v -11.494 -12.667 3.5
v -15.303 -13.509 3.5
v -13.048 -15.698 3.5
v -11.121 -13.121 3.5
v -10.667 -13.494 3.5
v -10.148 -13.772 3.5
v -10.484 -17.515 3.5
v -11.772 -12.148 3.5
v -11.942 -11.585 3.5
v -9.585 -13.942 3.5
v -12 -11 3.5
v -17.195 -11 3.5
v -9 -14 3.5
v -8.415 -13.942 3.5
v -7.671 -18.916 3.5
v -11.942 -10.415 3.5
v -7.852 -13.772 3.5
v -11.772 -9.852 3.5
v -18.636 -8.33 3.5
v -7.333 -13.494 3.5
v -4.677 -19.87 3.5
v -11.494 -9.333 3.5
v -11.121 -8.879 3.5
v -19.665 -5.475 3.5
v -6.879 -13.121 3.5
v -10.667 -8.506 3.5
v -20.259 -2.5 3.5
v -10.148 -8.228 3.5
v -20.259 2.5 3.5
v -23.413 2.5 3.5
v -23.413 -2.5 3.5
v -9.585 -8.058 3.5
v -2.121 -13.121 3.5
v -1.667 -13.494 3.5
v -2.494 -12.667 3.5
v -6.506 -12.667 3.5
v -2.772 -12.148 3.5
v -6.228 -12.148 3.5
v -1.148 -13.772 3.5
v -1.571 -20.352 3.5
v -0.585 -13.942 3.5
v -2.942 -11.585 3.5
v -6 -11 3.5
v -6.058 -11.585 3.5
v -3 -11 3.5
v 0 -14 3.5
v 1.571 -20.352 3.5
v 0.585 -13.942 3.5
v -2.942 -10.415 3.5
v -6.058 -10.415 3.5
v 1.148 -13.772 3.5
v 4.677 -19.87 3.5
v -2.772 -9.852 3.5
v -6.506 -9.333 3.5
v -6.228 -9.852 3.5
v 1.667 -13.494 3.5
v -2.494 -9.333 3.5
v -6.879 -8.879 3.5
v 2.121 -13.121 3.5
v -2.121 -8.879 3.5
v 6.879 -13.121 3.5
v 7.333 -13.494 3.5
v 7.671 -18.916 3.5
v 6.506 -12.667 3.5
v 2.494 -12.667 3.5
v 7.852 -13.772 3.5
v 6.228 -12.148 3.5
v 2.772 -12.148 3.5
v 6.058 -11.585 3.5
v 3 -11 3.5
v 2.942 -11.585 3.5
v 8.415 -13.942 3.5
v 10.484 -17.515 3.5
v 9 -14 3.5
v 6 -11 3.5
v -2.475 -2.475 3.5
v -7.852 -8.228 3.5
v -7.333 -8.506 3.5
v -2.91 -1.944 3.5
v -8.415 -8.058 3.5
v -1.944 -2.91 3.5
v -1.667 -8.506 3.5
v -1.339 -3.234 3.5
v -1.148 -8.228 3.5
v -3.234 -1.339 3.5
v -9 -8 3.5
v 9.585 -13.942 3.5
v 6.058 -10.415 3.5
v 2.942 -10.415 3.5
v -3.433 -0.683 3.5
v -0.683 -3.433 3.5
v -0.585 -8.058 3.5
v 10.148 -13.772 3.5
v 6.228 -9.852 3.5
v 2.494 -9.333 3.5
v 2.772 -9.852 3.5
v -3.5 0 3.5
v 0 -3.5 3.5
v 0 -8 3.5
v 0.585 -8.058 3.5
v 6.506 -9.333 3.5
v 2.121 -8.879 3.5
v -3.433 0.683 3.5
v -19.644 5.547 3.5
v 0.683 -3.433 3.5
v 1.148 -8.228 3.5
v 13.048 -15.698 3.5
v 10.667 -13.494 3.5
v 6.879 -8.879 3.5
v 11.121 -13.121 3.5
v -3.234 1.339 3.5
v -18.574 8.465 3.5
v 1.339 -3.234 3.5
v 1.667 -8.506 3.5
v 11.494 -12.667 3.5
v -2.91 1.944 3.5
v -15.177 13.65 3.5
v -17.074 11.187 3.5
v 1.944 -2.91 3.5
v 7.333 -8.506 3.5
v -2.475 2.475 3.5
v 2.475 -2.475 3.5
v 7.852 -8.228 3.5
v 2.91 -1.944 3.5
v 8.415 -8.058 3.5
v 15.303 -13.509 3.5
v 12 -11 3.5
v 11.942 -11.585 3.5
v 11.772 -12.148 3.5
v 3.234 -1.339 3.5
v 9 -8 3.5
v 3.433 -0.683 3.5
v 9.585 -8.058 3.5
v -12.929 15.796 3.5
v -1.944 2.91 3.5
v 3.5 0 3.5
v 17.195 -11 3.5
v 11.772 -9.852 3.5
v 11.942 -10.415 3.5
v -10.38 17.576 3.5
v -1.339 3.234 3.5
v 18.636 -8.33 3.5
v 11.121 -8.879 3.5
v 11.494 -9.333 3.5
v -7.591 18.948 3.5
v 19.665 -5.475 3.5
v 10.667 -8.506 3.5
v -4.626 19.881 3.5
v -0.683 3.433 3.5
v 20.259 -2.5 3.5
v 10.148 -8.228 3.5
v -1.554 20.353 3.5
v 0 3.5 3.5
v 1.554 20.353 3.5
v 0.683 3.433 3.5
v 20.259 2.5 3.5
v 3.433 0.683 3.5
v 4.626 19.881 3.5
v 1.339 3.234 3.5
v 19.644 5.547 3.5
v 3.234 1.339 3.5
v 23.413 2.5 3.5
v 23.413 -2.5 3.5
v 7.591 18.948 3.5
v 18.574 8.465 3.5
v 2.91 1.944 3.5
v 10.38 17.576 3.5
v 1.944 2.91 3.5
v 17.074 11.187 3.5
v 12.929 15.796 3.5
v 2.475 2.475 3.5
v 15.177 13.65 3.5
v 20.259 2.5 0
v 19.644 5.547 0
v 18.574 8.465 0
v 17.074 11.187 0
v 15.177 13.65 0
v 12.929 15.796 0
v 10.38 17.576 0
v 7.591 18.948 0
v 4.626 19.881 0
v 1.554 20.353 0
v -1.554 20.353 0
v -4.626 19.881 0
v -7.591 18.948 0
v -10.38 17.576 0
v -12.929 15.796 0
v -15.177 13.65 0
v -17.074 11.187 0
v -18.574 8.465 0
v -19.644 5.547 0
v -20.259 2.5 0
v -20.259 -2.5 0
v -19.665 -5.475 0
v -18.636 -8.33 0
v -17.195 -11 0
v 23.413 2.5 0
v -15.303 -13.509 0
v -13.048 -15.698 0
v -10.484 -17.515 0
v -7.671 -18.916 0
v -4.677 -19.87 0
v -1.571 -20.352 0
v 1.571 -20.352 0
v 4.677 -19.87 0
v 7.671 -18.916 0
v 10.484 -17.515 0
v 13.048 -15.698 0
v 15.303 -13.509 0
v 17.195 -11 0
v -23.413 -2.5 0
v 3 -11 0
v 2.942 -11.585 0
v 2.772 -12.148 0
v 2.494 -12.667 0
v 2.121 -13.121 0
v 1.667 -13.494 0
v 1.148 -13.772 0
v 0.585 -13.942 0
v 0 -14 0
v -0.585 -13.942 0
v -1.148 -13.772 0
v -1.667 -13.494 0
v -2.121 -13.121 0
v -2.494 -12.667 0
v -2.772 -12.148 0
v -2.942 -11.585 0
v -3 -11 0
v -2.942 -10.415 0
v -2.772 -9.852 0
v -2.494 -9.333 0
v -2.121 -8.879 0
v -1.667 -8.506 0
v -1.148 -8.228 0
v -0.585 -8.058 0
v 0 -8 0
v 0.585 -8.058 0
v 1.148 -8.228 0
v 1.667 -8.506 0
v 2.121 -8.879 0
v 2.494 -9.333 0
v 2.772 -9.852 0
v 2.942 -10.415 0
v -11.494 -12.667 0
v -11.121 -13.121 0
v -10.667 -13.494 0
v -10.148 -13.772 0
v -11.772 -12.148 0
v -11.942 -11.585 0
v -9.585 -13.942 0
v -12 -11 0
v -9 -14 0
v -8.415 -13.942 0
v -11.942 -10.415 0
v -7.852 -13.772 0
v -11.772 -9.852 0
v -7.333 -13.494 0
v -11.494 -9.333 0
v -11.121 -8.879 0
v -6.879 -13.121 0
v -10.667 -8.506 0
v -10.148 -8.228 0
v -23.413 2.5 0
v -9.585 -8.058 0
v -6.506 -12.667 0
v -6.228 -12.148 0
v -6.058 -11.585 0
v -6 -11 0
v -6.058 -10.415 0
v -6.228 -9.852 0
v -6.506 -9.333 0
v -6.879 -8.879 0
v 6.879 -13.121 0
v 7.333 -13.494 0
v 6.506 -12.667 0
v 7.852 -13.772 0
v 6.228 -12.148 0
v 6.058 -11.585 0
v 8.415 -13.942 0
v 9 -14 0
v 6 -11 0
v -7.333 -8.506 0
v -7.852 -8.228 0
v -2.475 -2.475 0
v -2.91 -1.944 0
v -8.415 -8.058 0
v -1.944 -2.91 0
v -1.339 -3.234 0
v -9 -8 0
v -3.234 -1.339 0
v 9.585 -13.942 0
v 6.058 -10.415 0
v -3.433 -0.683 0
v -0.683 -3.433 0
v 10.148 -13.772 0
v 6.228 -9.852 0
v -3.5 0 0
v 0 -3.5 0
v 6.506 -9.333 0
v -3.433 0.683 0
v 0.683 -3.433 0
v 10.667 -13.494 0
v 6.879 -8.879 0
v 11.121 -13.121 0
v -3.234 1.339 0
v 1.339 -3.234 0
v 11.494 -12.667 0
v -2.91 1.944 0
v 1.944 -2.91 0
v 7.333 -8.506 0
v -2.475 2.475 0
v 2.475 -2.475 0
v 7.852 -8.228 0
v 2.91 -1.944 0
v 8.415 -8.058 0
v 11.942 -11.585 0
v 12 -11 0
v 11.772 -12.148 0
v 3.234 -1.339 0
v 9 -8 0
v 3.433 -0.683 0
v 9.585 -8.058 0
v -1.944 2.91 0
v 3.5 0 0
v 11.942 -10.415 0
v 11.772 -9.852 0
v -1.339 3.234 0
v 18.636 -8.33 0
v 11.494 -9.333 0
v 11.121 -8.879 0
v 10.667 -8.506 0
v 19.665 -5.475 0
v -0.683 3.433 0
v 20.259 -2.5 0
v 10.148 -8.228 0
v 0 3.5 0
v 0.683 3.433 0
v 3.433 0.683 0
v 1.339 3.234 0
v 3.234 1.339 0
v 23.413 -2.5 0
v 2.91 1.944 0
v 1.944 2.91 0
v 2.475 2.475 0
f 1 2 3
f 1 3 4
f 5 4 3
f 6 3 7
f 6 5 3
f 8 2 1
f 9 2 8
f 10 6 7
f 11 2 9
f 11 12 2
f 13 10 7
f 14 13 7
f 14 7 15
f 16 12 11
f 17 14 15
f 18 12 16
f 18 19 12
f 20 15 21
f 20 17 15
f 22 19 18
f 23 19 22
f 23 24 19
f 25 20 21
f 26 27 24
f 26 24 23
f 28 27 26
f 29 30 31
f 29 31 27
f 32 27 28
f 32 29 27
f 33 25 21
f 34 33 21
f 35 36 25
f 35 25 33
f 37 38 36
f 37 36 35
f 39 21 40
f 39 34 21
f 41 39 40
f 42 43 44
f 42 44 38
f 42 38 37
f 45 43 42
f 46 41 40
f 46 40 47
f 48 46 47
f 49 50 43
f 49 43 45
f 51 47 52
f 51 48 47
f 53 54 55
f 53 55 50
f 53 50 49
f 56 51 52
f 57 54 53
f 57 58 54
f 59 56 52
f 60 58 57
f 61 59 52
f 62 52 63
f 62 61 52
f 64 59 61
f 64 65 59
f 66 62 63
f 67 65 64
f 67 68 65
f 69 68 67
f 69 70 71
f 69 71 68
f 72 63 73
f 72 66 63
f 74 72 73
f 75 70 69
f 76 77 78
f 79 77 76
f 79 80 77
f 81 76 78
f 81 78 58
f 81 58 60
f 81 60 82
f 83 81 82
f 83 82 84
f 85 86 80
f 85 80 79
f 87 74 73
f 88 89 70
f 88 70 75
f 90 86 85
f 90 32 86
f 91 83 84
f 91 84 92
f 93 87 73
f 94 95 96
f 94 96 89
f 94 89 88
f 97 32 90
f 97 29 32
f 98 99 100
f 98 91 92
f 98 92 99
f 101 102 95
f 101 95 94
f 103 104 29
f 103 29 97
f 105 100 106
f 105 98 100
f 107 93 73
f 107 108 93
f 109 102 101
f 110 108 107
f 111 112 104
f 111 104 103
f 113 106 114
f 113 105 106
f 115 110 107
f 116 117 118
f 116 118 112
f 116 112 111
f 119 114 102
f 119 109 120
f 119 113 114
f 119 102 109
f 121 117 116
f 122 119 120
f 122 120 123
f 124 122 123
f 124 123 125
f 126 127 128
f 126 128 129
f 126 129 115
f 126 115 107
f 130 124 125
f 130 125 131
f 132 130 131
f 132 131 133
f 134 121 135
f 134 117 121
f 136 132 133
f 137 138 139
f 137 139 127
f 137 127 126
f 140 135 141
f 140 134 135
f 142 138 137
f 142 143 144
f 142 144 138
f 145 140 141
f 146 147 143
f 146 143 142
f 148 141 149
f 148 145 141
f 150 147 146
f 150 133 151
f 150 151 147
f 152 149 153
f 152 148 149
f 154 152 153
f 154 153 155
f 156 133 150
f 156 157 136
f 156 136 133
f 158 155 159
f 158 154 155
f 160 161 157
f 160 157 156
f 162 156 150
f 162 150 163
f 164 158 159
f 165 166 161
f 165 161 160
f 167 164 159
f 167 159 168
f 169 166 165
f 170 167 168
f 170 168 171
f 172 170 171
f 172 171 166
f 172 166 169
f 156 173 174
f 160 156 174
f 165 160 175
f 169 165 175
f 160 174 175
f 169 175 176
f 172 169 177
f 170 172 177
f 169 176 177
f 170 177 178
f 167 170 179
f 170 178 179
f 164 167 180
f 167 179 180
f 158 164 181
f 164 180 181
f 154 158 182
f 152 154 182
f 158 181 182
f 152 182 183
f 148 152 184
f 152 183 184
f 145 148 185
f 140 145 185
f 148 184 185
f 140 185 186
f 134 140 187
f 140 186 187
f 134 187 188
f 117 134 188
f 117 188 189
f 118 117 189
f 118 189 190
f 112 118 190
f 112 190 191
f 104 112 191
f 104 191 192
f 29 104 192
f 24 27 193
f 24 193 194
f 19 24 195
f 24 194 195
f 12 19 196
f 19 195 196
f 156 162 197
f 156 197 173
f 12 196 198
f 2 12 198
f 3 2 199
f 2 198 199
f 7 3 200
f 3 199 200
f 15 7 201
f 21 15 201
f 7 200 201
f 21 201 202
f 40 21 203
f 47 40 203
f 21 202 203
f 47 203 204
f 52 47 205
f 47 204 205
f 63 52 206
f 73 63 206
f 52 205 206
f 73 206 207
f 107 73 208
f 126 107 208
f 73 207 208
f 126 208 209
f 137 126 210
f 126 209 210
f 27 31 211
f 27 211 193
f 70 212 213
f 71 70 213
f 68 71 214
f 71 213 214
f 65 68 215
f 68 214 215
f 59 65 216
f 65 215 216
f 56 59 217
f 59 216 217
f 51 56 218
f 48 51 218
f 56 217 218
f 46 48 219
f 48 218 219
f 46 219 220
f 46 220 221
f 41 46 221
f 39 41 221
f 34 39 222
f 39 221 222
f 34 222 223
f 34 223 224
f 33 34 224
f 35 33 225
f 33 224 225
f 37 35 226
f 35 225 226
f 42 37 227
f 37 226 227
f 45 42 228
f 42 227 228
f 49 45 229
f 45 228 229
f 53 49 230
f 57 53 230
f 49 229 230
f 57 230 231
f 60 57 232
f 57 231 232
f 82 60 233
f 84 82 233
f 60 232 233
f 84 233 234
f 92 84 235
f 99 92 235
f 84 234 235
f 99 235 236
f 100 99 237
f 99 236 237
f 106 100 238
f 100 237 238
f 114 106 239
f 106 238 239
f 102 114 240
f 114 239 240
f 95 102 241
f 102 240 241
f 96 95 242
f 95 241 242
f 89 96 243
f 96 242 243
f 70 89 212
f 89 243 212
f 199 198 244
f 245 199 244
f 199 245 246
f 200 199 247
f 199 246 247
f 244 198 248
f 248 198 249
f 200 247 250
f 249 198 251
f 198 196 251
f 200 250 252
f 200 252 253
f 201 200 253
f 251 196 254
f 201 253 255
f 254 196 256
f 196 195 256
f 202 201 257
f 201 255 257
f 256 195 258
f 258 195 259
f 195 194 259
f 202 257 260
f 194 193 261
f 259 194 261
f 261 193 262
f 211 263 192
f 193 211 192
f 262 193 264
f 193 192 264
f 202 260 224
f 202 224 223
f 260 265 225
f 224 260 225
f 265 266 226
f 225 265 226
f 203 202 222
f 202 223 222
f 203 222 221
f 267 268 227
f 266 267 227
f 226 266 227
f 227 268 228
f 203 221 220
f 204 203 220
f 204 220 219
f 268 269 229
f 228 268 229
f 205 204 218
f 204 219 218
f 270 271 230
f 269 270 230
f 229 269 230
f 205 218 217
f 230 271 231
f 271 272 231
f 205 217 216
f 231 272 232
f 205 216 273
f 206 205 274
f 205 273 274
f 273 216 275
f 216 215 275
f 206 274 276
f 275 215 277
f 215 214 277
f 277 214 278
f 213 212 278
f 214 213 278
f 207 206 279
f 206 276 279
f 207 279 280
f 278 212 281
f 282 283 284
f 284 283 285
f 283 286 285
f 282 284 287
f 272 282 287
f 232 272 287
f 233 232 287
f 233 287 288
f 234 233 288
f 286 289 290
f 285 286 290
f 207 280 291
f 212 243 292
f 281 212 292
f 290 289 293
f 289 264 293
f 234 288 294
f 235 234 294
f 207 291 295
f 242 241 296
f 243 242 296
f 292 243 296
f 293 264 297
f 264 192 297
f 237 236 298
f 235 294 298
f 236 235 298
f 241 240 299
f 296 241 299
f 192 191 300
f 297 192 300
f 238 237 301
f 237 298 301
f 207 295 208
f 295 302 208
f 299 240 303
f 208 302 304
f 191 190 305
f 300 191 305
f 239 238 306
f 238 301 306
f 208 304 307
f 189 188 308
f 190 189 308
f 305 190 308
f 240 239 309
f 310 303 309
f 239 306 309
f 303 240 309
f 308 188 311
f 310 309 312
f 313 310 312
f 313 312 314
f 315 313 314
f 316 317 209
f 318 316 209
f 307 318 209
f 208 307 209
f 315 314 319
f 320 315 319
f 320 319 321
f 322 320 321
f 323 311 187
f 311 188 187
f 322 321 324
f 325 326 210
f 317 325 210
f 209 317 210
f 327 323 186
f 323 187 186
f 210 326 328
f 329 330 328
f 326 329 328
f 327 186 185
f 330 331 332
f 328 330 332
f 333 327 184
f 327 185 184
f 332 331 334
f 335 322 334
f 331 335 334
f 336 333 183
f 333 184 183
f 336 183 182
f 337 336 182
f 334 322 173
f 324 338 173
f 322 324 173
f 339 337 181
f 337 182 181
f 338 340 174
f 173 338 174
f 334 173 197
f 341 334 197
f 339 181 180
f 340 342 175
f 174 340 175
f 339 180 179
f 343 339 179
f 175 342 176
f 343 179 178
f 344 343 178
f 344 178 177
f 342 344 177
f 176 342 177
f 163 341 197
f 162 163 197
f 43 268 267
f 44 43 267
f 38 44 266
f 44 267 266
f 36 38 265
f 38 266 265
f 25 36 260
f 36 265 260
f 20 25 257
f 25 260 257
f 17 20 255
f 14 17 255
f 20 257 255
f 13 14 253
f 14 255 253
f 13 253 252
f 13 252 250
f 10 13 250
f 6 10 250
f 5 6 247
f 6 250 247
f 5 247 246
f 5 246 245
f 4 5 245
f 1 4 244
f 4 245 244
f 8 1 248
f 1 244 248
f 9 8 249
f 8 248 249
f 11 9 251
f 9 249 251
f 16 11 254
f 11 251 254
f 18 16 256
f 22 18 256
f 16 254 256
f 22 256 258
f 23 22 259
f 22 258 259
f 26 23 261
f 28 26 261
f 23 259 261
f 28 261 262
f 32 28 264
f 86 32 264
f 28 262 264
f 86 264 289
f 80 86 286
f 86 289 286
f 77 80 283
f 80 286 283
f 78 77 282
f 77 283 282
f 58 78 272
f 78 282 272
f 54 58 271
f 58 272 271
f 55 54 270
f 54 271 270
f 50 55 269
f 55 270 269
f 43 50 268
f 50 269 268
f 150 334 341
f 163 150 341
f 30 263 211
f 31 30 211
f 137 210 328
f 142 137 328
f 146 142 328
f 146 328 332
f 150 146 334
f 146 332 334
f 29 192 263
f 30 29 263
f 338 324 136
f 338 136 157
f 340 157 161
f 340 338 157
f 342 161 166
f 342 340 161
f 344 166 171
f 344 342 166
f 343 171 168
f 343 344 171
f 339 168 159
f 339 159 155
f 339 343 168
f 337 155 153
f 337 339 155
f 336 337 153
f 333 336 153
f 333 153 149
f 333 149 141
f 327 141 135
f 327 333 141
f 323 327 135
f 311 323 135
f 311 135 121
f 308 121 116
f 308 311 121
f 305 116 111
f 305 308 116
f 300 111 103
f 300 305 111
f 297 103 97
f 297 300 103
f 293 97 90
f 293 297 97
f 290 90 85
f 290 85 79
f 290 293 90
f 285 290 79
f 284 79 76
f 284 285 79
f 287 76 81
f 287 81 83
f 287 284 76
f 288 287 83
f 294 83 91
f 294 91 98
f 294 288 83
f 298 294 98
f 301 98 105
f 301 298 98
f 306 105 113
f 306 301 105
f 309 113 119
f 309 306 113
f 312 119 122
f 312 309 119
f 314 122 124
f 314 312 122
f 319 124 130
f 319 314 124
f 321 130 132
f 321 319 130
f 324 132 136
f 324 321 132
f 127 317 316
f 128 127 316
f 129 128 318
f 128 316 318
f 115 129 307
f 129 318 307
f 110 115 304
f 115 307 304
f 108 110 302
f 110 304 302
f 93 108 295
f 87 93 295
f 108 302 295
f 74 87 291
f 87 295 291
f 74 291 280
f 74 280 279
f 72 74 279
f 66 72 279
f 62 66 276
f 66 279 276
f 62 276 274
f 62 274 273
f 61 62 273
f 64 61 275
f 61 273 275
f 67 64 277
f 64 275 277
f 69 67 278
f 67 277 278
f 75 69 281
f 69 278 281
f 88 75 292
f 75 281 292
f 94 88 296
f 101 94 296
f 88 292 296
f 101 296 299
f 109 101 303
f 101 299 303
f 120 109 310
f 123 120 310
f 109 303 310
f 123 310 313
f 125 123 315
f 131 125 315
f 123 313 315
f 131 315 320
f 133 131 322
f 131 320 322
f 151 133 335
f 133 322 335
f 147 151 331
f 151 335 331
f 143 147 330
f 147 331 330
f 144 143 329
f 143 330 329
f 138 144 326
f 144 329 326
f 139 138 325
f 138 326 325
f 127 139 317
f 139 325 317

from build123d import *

# Parameters (mm, degrees)
F0_R     = 3.5
F1_DEPTH = 3.5


with BuildPart() as f1:
    # F0 (on Top) → F1 (new body)
    with BuildSketch(Plane.XY):
        with BuildLine():
            Line((17.412545, 2.5), (20.258875, 2.5))
            ThreePointArc((20.258875, 2.5), (0, 20.412545), (-20.258875, 2.5))
            Line((-20.258875, 2.5), (-17.412545, 2.5))
            Line((-17.412545, 2.5), (-17.412545, -2.5))
            Line((-17.412545, -2.5), (-20.258875, -2.5))
            ThreePointArc((-20.258875, -2.5), (-19.203199, -6.921644), (-17.195116, -11))
            Line((-17.195116, -11), (-12, -11))
            ThreePointArc((-12, -11), (-9, -8), (-6, -11))
            Line((-6, -11), (-3, -11))
            ThreePointArc((-3, -11), (0, -8), (3, -11))
            Line((3, -11), (6, -11))
            ThreePointArc((6, -11), (9, -8), (12, -11))
            Line((12, -11), (17.195116, -11))
            ThreePointArc((17.195116, -11), (19.203199, -6.921644), (20.258875, -2.5))
            Line((20.258875, -2.5), (17.412545, -2.5))
            Line((17.412545, -2.5), (17.412545, 2.5))
        make_face()
        Circle(F0_R, mode=Mode.SUBTRACT)
        with BuildLine():
            ThreePointArc((-17.195116, -11), (0, -20.412545), (17.195116, -11))
            Line((17.195116, -11), (12, -11))
            ThreePointArc((12, -11), (9, -14), (6, -11))
            Line((6, -11), (3, -11))
            ThreePointArc((3, -11), (0, -14), (-3, -11))
            Line((-3, -11), (-6, -11))
            ThreePointArc((-6, -11), (-9, -14), (-12, -11))
            Line((-12, -11), (-17.195116, -11))
        make_face()
        with BuildLine():
            Line((-17.412545, 2.5), (-20.258875, 2.5))
            ThreePointArc((-20.258875, 2.5), (-20.412545, 0), (-20.258875, -2.5))
            Line((-20.258875, -2.5), (-17.412545, -2.5))
            Line((-17.412545, -2.5), (-17.412545, 2.5))
        make_face()
        with BuildLine():
            ThreePointArc((-20.258875, -2.5), (-20.412545, 0), (-20.258875, 2.5))
            Line((-20.258875, 2.5), (-23.412545, 2.5))
            Line((-23.412545, 2.5), (-23.412545, -2.5))
            Line((-23.412545, -2.5), (-20.258875, -2.5))
        make_face()
        with BuildLine():
            ThreePointArc((20.258875, -2.5), (20.374091, -1.252359), (20.412545, 0))
            ThreePointArc((20.412545, 0), (20.374091, 1.252359), (20.258875, 2.5))
            Line((20.258875, 2.5), (17.412545, 2.5))
            Line((17.412545, 2.5), (17.412545, -2.5))
            Line((17.412545, -2.5), (20.258875, -2.5))
        make_face()
        with BuildLine():
            ThreePointArc((20.258875, 2.5), (20.374091, 1.252359), (20.412545, 0))
            ThreePointArc((20.412545, 0), (20.374091, -1.252359), (20.258875, -2.5))
            Line((20.258875, -2.5), (23.412545, -2.5))
            Line((23.412545, -2.5), (23.412545, 2.5))
            Line((23.412545, 2.5), (20.258875, 2.5))
        make_face()
    extrude(amount=F1_DEPTH)


solid = f1.part
